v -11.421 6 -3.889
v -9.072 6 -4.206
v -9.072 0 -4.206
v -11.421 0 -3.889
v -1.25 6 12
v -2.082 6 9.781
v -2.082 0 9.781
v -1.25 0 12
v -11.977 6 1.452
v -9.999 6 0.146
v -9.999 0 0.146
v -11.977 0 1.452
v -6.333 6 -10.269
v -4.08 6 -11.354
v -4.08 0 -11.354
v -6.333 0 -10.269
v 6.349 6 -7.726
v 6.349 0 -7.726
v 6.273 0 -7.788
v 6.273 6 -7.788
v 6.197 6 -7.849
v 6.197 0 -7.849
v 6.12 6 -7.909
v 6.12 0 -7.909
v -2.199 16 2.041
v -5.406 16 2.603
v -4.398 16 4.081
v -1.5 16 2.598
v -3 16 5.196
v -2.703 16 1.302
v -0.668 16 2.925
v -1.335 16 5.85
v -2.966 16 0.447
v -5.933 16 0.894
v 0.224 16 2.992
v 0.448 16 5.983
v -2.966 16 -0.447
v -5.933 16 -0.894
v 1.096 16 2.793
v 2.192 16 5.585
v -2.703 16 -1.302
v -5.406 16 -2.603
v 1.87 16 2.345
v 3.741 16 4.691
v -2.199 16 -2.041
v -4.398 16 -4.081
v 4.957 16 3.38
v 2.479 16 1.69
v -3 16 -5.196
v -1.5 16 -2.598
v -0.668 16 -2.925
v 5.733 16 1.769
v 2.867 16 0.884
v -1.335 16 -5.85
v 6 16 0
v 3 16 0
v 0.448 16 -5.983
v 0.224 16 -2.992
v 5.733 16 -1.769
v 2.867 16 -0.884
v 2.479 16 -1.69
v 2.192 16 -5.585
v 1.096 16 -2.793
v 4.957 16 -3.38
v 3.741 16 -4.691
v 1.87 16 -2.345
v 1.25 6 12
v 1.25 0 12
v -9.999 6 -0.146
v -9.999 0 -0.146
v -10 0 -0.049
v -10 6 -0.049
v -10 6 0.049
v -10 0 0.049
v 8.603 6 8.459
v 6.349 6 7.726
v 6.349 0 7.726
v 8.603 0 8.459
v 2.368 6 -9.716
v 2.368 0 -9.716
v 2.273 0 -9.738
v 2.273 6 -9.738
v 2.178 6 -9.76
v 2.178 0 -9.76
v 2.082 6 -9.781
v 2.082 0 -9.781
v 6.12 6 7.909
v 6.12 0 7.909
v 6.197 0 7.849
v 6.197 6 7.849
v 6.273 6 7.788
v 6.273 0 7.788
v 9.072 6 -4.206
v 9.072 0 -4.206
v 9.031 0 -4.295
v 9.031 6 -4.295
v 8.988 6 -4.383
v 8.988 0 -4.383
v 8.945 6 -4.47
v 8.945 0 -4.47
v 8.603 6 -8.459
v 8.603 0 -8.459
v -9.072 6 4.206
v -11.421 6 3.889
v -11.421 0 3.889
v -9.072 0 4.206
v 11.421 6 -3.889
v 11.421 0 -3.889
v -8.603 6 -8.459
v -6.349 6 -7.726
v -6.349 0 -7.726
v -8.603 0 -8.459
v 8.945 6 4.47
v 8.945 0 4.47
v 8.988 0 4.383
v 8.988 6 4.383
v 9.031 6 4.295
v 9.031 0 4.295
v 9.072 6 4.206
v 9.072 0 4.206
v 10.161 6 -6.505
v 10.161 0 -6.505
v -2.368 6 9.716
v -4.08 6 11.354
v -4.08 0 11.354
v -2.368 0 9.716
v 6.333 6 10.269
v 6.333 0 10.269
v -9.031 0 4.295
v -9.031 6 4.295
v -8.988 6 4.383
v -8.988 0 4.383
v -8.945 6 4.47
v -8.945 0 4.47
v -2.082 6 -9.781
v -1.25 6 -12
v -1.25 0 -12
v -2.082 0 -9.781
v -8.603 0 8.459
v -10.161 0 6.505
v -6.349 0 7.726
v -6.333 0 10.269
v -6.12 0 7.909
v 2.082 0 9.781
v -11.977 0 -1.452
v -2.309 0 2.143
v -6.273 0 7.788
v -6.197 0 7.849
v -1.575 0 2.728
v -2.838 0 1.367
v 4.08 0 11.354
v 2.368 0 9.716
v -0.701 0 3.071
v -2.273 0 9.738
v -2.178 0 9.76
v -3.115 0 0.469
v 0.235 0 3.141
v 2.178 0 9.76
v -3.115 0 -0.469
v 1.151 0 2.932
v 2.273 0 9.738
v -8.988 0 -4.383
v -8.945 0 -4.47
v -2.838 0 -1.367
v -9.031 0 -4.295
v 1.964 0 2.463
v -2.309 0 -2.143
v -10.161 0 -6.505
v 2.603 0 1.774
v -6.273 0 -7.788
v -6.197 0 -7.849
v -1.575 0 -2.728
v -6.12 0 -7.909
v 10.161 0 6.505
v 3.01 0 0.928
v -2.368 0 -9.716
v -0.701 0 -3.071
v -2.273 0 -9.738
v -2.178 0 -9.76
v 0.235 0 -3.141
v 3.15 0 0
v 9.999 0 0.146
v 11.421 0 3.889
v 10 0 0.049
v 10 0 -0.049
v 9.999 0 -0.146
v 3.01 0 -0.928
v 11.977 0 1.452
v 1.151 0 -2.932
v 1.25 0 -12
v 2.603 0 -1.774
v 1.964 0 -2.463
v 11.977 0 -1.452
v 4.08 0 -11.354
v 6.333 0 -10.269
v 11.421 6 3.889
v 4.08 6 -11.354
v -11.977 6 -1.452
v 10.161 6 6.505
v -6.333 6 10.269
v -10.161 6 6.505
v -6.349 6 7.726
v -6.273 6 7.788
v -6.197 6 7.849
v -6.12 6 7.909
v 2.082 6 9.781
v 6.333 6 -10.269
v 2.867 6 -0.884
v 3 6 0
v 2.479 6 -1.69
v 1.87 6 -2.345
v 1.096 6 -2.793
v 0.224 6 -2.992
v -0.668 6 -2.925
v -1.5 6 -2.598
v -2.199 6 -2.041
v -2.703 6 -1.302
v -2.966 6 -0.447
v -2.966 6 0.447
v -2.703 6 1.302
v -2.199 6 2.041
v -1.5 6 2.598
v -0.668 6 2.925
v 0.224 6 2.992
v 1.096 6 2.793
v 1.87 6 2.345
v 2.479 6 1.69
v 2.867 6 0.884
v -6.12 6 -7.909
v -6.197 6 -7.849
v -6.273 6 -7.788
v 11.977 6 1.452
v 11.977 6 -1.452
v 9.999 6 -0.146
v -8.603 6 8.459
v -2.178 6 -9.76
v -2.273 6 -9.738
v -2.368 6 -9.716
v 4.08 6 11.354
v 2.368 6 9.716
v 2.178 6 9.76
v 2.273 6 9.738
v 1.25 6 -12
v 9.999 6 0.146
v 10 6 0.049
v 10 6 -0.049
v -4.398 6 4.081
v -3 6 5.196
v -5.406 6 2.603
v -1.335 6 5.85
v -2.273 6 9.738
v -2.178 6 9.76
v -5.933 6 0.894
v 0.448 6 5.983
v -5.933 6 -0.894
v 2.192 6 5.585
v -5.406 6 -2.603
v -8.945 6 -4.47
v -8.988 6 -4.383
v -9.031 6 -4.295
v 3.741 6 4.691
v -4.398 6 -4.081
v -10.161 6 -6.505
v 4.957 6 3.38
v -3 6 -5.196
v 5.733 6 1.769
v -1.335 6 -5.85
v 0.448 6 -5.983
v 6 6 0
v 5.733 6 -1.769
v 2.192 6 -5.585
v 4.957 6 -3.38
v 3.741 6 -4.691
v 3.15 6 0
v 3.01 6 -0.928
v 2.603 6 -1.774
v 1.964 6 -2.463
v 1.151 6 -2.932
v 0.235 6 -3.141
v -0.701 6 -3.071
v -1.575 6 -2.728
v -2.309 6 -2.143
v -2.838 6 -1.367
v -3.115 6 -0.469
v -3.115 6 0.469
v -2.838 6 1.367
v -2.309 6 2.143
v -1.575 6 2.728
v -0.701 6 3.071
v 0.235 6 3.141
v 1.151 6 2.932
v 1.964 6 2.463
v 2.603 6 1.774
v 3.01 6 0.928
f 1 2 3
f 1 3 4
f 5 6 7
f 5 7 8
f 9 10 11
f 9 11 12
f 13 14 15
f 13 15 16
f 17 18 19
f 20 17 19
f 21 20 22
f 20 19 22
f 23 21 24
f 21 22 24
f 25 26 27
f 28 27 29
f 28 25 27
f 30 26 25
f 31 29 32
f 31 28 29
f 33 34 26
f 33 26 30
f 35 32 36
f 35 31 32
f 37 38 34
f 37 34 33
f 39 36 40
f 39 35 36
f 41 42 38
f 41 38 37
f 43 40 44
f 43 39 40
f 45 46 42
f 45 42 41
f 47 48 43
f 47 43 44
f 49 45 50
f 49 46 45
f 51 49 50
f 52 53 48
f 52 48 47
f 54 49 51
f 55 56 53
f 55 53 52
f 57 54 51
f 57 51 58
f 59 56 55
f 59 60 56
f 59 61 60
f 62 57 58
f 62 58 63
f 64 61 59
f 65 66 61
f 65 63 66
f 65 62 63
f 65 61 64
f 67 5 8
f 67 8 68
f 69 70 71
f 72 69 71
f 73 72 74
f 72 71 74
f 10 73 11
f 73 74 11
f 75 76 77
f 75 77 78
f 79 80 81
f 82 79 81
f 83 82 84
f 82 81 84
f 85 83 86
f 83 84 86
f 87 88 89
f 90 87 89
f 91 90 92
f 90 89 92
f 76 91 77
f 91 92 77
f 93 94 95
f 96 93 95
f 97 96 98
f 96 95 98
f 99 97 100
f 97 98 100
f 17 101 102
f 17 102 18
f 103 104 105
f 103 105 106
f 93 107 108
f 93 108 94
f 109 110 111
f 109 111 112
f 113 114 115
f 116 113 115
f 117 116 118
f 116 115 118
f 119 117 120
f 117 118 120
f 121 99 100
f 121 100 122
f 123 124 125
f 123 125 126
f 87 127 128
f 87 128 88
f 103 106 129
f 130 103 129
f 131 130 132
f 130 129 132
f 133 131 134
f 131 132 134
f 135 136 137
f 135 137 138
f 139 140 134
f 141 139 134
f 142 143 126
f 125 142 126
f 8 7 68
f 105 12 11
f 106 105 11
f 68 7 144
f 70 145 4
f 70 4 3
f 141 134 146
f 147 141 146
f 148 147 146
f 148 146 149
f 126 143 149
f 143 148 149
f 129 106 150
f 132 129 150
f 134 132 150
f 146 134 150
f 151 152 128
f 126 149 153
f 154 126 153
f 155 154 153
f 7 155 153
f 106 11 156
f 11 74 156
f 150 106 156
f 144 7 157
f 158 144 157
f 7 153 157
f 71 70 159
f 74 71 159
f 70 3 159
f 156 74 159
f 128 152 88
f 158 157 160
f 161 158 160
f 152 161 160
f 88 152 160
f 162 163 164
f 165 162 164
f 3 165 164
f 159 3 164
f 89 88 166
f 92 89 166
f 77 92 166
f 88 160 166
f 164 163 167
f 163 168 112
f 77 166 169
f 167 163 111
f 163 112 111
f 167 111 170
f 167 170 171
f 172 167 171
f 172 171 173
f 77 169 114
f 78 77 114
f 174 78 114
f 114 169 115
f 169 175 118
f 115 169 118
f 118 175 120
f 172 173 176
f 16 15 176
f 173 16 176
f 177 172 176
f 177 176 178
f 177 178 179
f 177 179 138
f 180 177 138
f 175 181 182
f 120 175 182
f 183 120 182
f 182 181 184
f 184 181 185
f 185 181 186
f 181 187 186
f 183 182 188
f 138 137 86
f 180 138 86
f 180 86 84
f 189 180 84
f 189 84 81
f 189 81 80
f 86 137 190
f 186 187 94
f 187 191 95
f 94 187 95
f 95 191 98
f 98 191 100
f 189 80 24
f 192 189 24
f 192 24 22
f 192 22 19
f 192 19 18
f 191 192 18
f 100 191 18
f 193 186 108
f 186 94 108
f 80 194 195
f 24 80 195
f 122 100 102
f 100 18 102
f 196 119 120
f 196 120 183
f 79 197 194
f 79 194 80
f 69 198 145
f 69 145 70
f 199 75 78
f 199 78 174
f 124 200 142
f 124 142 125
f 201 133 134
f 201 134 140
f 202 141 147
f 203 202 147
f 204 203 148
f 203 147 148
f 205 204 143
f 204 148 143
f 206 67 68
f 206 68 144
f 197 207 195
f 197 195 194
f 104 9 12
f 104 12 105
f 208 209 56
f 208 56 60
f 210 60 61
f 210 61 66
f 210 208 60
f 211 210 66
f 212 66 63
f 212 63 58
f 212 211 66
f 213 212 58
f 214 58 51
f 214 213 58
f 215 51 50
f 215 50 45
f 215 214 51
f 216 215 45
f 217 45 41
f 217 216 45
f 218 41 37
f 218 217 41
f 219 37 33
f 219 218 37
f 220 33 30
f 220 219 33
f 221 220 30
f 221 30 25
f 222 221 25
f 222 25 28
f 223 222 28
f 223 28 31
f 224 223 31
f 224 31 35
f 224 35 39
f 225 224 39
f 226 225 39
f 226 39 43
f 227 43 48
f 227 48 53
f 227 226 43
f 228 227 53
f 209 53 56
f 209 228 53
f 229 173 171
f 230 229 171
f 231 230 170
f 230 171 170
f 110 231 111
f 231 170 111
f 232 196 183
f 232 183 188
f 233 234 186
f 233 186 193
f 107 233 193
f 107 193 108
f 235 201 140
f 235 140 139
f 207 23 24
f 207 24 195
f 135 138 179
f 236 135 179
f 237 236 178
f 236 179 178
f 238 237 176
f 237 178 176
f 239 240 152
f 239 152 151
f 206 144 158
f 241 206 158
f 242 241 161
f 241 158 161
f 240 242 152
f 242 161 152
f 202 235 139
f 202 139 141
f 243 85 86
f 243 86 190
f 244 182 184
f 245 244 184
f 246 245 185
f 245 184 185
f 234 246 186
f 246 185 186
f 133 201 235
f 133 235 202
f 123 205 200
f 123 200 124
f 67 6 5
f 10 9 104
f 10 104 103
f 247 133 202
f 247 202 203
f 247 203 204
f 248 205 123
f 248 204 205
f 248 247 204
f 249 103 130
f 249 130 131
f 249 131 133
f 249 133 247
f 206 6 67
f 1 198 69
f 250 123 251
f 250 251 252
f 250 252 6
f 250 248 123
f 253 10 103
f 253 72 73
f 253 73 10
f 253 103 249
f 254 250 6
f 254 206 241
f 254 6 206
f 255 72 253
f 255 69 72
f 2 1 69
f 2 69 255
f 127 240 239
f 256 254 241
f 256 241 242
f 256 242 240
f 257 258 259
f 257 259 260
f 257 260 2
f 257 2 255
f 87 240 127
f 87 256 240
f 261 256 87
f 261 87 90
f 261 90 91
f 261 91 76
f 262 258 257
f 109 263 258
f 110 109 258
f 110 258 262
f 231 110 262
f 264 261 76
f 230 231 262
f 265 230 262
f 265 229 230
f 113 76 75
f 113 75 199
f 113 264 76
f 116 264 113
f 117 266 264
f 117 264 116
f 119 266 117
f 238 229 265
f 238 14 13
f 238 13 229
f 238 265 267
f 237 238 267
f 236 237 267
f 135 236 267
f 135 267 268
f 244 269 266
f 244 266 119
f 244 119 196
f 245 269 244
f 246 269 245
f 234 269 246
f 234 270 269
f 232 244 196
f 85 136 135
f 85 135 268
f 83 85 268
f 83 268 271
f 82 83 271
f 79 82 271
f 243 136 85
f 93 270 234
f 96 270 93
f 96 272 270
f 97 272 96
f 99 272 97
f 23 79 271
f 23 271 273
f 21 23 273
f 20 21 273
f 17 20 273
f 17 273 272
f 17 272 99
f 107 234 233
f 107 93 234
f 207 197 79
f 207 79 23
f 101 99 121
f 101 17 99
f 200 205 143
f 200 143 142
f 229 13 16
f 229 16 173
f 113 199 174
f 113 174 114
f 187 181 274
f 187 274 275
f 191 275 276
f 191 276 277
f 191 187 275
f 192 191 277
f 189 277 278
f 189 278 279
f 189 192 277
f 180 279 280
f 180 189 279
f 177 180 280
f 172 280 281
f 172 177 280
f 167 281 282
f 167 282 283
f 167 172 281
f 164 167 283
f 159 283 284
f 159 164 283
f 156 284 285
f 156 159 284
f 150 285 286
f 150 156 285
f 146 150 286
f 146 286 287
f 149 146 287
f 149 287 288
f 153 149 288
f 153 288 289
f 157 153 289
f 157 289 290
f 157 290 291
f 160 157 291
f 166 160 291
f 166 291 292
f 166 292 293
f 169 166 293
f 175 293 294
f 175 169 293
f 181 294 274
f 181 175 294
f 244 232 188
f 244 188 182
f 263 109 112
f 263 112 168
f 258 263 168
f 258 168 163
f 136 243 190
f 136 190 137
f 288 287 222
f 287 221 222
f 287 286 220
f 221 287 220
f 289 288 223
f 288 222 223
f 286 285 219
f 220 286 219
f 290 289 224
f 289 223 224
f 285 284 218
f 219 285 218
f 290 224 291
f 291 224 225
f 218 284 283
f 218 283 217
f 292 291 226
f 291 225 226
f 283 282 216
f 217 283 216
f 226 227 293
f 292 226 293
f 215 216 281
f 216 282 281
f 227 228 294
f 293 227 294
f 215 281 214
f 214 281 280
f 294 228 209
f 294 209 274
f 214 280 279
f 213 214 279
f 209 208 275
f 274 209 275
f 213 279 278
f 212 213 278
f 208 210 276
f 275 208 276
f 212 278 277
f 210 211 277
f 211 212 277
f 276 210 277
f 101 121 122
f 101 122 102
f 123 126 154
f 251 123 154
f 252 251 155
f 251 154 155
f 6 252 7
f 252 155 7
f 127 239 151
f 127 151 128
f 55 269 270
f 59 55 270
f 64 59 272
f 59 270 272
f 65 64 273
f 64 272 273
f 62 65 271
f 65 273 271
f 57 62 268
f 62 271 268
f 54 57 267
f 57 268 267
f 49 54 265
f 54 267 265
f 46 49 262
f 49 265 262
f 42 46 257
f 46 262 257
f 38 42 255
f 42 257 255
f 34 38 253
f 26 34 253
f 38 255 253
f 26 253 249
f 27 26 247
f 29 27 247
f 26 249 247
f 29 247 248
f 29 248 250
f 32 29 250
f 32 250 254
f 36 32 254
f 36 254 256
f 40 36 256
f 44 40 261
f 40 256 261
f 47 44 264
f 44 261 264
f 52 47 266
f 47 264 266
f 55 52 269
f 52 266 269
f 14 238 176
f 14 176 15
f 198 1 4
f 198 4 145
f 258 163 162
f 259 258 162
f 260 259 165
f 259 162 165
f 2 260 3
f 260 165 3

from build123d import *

# Parameters (mm, degrees)
SKETCH1_R           = 10
SKETCH1_R_2         = 3.15
BOSS_EXTRUDE1_DEPTH = 6
SKETCH2_R           = 6
SKETCH2_R_2         = 3
BOSS_EXTRUDE2_DEPTH = 10
BOSS_EXTRUDE3_DEPTH = 6


with BuildPart() as part:
    # Sketch1 → Boss-Extrude1 (new body)
    with BuildSketch(Plane(origin=(0, 0, 0), x_dir=(1, 0, 0), z_dir=(0, 1, 0))):
        Circle(SKETCH1_R)
        Circle(SKETCH1_R_2, mode=Mode.SUBTRACT)
    extrude(amount=BOSS_EXTRUDE1_DEPTH)

    # Sketch2 → Boss-Extrude2 (add)
    with BuildSketch(Plane(origin=(0, 6, 0), x_dir=(1, 0, 0), z_dir=(0, 1, 0))):
        Circle(SKETCH2_R)
        Circle(SKETCH2_R_2, mode=Mode.SUBTRACT)
    extrude(amount=BOSS_EXTRUDE2_DEPTH)

    # Sketch3 → Boss-Extrude3 (add)
    with BuildSketch(Plane(origin=(0, 6, 0), x_dir=(1, 0, 0), z_dir=(0, 1, 0))):
        with BuildLine():
            Line((1.25, 12), (-1.25, 12))
            Line((-1.25, 12), (-2.082191781, 9.780821918))
            ThreePointArc((-2.082191781, 9.780821918), (0, 10), (2.082191781, 9.780821918))
            Line((2.082191781, 9.780821918), (1.25, 12))
        make_face()
        with BuildLine():
            ThreePointArc((-6.119729557, 7.908786895), (-4.338837391, 9.009688679), (-2.367749614, 9.715645206))
            Line((-2.367749614, 9.715645206), (-4.080393785, 11.353981089))
            Line((-4.080393785, 11.353981089), (-6.332815954, 10.269271741))
            Line((-6.332815954, 10.269271741), (-6.119729557, 7.908786895))
        make_face()
        with BuildLine():
            Line((4.080393785, 11.353981089), (2.367749614, 9.715645206))
            ThreePointArc((2.367749614, 9.715645206), (4.338837391, 9.009688679), (6.119729557, 7.908786895))
            Line((6.119729557, 7.908786895), (6.332815954, 10.269271741))
            Line((6.332815954, 10.269271741), (4.080393785, 11.353981089))
        make_face()
        with BuildLine():
            ThreePointArc((-8.945179841, 4.470319633), (-7.818314825, 6.234898019), (-6.348729159, 7.726165806))
            Line((-6.348729159, 7.726165806), (-8.602615537, 8.459166975))
            Line((-8.602615537, 8.459166975), (-10.161340042, 6.504588269))
            Line((-10.161340042, 6.504588269), (-8.945179841, 4.470319633))
        make_face()
        with BuildLine():
            Line((8.602615537, 8.459166975), (6.348729159, 7.726165806))
            ThreePointArc((6.348729159, 7.726165806), (7.818314825, 6.234898019), (8.945179841, 4.470319633))
            Line((8.945179841, 4.470319633), (10.161340042, 6.504588269))
            Line((10.161340042, 6.504588269), (8.602615537, 8.459166975))
        make_face()
        with BuildLine():
            ThreePointArc((-9.998927551, 0.146450742), (-9.749279122, 2.22520934), (-9.072265032, 4.206424514))
            Line((-9.072265032, 4.206424514), (-11.420983779, 3.888911098))
            Line((-11.420983779, 3.888911098), (-11.977286114, 1.451591317))
            Line((-11.977286114, 1.451591317), (-9.998927551, 0.146450742))
        make_face()
        with BuildLine():
            Line((11.420983779, 3.888911098), (9.072265032, 4.206424514))
            ThreePointArc((9.072265032, 4.206424514), (9.749279122, 2.22520934), (9.998927551, 0.146450742))
            Line((9.998927551, 0.146450742), (11.977286114, 1.451591317))
            Line((11.977286114, 1.451591317), (11.420983779, 3.888911098))
        make_face()
        with BuildLine():
            ThreePointArc((-9.072265032, -4.206424514), (-9.749279122, -2.22520934), (-9.998927551, -0.146450742))
            Line((-9.998927551, -0.146450742), (-11.977286114, -1.451591317))
            Line((-11.977286114, -1.451591317), (-11.420983779, -3.888911098))
            Line((-11.420983779, -3.888911098), (-9.072265032, -4.206424514))
        make_face()
        with BuildLine():
            Line((11.977286114, -1.451591317), (9.998927551, -0.146450742))
            ThreePointArc((9.998927551, -0.146450742), (9.749279122, -2.22520934), (9.072265032, -4.206424514))
            Line((9.072265032, -4.206424514), (11.420983779, -3.888911098))
            Line((11.420983779, -3.888911098), (11.977286114, -1.451591317))
        make_face()
        with BuildLine():
            ThreePointArc((-6.348729159, -7.726165806), (-7.818314825, -6.234898019), (-8.945179841, -4.470319633))
            Line((-8.945179841, -4.470319633), (-10.161340042, -6.504588269))
            Line((-10.161340042, -6.504588269), (-8.602615537, -8.459166975))
            Line((-8.602615537, -8.459166975), (-6.348729159, -7.726165806))
        make_face()
        with BuildLine():
            Line((10.161340042, -6.504588269), (8.945179841, -4.470319633))
            ThreePointArc((8.945179841, -4.470319633), (7.818314825, -6.234898019), (6.348729159, -7.726165806))
            Line((6.348729159, -7.726165806), (8.602615537, -8.459166975))
            Line((8.602615537, -8.459166975), (10.161340042, -6.504588269))
        make_face()
        with BuildLine():
            ThreePointArc((-2.367749614, -9.715645206), (-4.338837391, -9.009688679), (-6.119729557, -7.908786895))
            Line((-6.119729557, -7.908786895), (-6.332815954, -10.269271741))
            Line((-6.332815954, -10.269271741), (-4.080393785, -11.353981089))
            Line((-4.080393785, -11.353981089), (-2.367749614, -9.715645206))
        make_face()
        with BuildLine():
            Line((6.332815954, -10.269271741), (6.119729557, -7.908786895))
            ThreePointArc((6.119729557, -7.908786895), (4.338837391, -9.009688679), (2.367749614, -9.715645206))
            Line((2.367749614, -9.715645206), (4.080393785, -11.353981089))
            Line((4.080393785, -11.353981089), (6.332815954, -10.269271741))
        make_face()
        with BuildLine():
            ThreePointArc((2.082191781, -9.780821918), (0, -10), (-2.082191781, -9.780821918))
            Line((-2.082191781, -9.780821918), (-1.25, -12))
            Line((-1.25, -12), (1.25, -12))
            Line((1.25, -12), (2.082191781, -9.780821918))
        make_face()
    extrude(amount=-BOSS_EXTRUDE3_DEPTH)


solid = part.part
